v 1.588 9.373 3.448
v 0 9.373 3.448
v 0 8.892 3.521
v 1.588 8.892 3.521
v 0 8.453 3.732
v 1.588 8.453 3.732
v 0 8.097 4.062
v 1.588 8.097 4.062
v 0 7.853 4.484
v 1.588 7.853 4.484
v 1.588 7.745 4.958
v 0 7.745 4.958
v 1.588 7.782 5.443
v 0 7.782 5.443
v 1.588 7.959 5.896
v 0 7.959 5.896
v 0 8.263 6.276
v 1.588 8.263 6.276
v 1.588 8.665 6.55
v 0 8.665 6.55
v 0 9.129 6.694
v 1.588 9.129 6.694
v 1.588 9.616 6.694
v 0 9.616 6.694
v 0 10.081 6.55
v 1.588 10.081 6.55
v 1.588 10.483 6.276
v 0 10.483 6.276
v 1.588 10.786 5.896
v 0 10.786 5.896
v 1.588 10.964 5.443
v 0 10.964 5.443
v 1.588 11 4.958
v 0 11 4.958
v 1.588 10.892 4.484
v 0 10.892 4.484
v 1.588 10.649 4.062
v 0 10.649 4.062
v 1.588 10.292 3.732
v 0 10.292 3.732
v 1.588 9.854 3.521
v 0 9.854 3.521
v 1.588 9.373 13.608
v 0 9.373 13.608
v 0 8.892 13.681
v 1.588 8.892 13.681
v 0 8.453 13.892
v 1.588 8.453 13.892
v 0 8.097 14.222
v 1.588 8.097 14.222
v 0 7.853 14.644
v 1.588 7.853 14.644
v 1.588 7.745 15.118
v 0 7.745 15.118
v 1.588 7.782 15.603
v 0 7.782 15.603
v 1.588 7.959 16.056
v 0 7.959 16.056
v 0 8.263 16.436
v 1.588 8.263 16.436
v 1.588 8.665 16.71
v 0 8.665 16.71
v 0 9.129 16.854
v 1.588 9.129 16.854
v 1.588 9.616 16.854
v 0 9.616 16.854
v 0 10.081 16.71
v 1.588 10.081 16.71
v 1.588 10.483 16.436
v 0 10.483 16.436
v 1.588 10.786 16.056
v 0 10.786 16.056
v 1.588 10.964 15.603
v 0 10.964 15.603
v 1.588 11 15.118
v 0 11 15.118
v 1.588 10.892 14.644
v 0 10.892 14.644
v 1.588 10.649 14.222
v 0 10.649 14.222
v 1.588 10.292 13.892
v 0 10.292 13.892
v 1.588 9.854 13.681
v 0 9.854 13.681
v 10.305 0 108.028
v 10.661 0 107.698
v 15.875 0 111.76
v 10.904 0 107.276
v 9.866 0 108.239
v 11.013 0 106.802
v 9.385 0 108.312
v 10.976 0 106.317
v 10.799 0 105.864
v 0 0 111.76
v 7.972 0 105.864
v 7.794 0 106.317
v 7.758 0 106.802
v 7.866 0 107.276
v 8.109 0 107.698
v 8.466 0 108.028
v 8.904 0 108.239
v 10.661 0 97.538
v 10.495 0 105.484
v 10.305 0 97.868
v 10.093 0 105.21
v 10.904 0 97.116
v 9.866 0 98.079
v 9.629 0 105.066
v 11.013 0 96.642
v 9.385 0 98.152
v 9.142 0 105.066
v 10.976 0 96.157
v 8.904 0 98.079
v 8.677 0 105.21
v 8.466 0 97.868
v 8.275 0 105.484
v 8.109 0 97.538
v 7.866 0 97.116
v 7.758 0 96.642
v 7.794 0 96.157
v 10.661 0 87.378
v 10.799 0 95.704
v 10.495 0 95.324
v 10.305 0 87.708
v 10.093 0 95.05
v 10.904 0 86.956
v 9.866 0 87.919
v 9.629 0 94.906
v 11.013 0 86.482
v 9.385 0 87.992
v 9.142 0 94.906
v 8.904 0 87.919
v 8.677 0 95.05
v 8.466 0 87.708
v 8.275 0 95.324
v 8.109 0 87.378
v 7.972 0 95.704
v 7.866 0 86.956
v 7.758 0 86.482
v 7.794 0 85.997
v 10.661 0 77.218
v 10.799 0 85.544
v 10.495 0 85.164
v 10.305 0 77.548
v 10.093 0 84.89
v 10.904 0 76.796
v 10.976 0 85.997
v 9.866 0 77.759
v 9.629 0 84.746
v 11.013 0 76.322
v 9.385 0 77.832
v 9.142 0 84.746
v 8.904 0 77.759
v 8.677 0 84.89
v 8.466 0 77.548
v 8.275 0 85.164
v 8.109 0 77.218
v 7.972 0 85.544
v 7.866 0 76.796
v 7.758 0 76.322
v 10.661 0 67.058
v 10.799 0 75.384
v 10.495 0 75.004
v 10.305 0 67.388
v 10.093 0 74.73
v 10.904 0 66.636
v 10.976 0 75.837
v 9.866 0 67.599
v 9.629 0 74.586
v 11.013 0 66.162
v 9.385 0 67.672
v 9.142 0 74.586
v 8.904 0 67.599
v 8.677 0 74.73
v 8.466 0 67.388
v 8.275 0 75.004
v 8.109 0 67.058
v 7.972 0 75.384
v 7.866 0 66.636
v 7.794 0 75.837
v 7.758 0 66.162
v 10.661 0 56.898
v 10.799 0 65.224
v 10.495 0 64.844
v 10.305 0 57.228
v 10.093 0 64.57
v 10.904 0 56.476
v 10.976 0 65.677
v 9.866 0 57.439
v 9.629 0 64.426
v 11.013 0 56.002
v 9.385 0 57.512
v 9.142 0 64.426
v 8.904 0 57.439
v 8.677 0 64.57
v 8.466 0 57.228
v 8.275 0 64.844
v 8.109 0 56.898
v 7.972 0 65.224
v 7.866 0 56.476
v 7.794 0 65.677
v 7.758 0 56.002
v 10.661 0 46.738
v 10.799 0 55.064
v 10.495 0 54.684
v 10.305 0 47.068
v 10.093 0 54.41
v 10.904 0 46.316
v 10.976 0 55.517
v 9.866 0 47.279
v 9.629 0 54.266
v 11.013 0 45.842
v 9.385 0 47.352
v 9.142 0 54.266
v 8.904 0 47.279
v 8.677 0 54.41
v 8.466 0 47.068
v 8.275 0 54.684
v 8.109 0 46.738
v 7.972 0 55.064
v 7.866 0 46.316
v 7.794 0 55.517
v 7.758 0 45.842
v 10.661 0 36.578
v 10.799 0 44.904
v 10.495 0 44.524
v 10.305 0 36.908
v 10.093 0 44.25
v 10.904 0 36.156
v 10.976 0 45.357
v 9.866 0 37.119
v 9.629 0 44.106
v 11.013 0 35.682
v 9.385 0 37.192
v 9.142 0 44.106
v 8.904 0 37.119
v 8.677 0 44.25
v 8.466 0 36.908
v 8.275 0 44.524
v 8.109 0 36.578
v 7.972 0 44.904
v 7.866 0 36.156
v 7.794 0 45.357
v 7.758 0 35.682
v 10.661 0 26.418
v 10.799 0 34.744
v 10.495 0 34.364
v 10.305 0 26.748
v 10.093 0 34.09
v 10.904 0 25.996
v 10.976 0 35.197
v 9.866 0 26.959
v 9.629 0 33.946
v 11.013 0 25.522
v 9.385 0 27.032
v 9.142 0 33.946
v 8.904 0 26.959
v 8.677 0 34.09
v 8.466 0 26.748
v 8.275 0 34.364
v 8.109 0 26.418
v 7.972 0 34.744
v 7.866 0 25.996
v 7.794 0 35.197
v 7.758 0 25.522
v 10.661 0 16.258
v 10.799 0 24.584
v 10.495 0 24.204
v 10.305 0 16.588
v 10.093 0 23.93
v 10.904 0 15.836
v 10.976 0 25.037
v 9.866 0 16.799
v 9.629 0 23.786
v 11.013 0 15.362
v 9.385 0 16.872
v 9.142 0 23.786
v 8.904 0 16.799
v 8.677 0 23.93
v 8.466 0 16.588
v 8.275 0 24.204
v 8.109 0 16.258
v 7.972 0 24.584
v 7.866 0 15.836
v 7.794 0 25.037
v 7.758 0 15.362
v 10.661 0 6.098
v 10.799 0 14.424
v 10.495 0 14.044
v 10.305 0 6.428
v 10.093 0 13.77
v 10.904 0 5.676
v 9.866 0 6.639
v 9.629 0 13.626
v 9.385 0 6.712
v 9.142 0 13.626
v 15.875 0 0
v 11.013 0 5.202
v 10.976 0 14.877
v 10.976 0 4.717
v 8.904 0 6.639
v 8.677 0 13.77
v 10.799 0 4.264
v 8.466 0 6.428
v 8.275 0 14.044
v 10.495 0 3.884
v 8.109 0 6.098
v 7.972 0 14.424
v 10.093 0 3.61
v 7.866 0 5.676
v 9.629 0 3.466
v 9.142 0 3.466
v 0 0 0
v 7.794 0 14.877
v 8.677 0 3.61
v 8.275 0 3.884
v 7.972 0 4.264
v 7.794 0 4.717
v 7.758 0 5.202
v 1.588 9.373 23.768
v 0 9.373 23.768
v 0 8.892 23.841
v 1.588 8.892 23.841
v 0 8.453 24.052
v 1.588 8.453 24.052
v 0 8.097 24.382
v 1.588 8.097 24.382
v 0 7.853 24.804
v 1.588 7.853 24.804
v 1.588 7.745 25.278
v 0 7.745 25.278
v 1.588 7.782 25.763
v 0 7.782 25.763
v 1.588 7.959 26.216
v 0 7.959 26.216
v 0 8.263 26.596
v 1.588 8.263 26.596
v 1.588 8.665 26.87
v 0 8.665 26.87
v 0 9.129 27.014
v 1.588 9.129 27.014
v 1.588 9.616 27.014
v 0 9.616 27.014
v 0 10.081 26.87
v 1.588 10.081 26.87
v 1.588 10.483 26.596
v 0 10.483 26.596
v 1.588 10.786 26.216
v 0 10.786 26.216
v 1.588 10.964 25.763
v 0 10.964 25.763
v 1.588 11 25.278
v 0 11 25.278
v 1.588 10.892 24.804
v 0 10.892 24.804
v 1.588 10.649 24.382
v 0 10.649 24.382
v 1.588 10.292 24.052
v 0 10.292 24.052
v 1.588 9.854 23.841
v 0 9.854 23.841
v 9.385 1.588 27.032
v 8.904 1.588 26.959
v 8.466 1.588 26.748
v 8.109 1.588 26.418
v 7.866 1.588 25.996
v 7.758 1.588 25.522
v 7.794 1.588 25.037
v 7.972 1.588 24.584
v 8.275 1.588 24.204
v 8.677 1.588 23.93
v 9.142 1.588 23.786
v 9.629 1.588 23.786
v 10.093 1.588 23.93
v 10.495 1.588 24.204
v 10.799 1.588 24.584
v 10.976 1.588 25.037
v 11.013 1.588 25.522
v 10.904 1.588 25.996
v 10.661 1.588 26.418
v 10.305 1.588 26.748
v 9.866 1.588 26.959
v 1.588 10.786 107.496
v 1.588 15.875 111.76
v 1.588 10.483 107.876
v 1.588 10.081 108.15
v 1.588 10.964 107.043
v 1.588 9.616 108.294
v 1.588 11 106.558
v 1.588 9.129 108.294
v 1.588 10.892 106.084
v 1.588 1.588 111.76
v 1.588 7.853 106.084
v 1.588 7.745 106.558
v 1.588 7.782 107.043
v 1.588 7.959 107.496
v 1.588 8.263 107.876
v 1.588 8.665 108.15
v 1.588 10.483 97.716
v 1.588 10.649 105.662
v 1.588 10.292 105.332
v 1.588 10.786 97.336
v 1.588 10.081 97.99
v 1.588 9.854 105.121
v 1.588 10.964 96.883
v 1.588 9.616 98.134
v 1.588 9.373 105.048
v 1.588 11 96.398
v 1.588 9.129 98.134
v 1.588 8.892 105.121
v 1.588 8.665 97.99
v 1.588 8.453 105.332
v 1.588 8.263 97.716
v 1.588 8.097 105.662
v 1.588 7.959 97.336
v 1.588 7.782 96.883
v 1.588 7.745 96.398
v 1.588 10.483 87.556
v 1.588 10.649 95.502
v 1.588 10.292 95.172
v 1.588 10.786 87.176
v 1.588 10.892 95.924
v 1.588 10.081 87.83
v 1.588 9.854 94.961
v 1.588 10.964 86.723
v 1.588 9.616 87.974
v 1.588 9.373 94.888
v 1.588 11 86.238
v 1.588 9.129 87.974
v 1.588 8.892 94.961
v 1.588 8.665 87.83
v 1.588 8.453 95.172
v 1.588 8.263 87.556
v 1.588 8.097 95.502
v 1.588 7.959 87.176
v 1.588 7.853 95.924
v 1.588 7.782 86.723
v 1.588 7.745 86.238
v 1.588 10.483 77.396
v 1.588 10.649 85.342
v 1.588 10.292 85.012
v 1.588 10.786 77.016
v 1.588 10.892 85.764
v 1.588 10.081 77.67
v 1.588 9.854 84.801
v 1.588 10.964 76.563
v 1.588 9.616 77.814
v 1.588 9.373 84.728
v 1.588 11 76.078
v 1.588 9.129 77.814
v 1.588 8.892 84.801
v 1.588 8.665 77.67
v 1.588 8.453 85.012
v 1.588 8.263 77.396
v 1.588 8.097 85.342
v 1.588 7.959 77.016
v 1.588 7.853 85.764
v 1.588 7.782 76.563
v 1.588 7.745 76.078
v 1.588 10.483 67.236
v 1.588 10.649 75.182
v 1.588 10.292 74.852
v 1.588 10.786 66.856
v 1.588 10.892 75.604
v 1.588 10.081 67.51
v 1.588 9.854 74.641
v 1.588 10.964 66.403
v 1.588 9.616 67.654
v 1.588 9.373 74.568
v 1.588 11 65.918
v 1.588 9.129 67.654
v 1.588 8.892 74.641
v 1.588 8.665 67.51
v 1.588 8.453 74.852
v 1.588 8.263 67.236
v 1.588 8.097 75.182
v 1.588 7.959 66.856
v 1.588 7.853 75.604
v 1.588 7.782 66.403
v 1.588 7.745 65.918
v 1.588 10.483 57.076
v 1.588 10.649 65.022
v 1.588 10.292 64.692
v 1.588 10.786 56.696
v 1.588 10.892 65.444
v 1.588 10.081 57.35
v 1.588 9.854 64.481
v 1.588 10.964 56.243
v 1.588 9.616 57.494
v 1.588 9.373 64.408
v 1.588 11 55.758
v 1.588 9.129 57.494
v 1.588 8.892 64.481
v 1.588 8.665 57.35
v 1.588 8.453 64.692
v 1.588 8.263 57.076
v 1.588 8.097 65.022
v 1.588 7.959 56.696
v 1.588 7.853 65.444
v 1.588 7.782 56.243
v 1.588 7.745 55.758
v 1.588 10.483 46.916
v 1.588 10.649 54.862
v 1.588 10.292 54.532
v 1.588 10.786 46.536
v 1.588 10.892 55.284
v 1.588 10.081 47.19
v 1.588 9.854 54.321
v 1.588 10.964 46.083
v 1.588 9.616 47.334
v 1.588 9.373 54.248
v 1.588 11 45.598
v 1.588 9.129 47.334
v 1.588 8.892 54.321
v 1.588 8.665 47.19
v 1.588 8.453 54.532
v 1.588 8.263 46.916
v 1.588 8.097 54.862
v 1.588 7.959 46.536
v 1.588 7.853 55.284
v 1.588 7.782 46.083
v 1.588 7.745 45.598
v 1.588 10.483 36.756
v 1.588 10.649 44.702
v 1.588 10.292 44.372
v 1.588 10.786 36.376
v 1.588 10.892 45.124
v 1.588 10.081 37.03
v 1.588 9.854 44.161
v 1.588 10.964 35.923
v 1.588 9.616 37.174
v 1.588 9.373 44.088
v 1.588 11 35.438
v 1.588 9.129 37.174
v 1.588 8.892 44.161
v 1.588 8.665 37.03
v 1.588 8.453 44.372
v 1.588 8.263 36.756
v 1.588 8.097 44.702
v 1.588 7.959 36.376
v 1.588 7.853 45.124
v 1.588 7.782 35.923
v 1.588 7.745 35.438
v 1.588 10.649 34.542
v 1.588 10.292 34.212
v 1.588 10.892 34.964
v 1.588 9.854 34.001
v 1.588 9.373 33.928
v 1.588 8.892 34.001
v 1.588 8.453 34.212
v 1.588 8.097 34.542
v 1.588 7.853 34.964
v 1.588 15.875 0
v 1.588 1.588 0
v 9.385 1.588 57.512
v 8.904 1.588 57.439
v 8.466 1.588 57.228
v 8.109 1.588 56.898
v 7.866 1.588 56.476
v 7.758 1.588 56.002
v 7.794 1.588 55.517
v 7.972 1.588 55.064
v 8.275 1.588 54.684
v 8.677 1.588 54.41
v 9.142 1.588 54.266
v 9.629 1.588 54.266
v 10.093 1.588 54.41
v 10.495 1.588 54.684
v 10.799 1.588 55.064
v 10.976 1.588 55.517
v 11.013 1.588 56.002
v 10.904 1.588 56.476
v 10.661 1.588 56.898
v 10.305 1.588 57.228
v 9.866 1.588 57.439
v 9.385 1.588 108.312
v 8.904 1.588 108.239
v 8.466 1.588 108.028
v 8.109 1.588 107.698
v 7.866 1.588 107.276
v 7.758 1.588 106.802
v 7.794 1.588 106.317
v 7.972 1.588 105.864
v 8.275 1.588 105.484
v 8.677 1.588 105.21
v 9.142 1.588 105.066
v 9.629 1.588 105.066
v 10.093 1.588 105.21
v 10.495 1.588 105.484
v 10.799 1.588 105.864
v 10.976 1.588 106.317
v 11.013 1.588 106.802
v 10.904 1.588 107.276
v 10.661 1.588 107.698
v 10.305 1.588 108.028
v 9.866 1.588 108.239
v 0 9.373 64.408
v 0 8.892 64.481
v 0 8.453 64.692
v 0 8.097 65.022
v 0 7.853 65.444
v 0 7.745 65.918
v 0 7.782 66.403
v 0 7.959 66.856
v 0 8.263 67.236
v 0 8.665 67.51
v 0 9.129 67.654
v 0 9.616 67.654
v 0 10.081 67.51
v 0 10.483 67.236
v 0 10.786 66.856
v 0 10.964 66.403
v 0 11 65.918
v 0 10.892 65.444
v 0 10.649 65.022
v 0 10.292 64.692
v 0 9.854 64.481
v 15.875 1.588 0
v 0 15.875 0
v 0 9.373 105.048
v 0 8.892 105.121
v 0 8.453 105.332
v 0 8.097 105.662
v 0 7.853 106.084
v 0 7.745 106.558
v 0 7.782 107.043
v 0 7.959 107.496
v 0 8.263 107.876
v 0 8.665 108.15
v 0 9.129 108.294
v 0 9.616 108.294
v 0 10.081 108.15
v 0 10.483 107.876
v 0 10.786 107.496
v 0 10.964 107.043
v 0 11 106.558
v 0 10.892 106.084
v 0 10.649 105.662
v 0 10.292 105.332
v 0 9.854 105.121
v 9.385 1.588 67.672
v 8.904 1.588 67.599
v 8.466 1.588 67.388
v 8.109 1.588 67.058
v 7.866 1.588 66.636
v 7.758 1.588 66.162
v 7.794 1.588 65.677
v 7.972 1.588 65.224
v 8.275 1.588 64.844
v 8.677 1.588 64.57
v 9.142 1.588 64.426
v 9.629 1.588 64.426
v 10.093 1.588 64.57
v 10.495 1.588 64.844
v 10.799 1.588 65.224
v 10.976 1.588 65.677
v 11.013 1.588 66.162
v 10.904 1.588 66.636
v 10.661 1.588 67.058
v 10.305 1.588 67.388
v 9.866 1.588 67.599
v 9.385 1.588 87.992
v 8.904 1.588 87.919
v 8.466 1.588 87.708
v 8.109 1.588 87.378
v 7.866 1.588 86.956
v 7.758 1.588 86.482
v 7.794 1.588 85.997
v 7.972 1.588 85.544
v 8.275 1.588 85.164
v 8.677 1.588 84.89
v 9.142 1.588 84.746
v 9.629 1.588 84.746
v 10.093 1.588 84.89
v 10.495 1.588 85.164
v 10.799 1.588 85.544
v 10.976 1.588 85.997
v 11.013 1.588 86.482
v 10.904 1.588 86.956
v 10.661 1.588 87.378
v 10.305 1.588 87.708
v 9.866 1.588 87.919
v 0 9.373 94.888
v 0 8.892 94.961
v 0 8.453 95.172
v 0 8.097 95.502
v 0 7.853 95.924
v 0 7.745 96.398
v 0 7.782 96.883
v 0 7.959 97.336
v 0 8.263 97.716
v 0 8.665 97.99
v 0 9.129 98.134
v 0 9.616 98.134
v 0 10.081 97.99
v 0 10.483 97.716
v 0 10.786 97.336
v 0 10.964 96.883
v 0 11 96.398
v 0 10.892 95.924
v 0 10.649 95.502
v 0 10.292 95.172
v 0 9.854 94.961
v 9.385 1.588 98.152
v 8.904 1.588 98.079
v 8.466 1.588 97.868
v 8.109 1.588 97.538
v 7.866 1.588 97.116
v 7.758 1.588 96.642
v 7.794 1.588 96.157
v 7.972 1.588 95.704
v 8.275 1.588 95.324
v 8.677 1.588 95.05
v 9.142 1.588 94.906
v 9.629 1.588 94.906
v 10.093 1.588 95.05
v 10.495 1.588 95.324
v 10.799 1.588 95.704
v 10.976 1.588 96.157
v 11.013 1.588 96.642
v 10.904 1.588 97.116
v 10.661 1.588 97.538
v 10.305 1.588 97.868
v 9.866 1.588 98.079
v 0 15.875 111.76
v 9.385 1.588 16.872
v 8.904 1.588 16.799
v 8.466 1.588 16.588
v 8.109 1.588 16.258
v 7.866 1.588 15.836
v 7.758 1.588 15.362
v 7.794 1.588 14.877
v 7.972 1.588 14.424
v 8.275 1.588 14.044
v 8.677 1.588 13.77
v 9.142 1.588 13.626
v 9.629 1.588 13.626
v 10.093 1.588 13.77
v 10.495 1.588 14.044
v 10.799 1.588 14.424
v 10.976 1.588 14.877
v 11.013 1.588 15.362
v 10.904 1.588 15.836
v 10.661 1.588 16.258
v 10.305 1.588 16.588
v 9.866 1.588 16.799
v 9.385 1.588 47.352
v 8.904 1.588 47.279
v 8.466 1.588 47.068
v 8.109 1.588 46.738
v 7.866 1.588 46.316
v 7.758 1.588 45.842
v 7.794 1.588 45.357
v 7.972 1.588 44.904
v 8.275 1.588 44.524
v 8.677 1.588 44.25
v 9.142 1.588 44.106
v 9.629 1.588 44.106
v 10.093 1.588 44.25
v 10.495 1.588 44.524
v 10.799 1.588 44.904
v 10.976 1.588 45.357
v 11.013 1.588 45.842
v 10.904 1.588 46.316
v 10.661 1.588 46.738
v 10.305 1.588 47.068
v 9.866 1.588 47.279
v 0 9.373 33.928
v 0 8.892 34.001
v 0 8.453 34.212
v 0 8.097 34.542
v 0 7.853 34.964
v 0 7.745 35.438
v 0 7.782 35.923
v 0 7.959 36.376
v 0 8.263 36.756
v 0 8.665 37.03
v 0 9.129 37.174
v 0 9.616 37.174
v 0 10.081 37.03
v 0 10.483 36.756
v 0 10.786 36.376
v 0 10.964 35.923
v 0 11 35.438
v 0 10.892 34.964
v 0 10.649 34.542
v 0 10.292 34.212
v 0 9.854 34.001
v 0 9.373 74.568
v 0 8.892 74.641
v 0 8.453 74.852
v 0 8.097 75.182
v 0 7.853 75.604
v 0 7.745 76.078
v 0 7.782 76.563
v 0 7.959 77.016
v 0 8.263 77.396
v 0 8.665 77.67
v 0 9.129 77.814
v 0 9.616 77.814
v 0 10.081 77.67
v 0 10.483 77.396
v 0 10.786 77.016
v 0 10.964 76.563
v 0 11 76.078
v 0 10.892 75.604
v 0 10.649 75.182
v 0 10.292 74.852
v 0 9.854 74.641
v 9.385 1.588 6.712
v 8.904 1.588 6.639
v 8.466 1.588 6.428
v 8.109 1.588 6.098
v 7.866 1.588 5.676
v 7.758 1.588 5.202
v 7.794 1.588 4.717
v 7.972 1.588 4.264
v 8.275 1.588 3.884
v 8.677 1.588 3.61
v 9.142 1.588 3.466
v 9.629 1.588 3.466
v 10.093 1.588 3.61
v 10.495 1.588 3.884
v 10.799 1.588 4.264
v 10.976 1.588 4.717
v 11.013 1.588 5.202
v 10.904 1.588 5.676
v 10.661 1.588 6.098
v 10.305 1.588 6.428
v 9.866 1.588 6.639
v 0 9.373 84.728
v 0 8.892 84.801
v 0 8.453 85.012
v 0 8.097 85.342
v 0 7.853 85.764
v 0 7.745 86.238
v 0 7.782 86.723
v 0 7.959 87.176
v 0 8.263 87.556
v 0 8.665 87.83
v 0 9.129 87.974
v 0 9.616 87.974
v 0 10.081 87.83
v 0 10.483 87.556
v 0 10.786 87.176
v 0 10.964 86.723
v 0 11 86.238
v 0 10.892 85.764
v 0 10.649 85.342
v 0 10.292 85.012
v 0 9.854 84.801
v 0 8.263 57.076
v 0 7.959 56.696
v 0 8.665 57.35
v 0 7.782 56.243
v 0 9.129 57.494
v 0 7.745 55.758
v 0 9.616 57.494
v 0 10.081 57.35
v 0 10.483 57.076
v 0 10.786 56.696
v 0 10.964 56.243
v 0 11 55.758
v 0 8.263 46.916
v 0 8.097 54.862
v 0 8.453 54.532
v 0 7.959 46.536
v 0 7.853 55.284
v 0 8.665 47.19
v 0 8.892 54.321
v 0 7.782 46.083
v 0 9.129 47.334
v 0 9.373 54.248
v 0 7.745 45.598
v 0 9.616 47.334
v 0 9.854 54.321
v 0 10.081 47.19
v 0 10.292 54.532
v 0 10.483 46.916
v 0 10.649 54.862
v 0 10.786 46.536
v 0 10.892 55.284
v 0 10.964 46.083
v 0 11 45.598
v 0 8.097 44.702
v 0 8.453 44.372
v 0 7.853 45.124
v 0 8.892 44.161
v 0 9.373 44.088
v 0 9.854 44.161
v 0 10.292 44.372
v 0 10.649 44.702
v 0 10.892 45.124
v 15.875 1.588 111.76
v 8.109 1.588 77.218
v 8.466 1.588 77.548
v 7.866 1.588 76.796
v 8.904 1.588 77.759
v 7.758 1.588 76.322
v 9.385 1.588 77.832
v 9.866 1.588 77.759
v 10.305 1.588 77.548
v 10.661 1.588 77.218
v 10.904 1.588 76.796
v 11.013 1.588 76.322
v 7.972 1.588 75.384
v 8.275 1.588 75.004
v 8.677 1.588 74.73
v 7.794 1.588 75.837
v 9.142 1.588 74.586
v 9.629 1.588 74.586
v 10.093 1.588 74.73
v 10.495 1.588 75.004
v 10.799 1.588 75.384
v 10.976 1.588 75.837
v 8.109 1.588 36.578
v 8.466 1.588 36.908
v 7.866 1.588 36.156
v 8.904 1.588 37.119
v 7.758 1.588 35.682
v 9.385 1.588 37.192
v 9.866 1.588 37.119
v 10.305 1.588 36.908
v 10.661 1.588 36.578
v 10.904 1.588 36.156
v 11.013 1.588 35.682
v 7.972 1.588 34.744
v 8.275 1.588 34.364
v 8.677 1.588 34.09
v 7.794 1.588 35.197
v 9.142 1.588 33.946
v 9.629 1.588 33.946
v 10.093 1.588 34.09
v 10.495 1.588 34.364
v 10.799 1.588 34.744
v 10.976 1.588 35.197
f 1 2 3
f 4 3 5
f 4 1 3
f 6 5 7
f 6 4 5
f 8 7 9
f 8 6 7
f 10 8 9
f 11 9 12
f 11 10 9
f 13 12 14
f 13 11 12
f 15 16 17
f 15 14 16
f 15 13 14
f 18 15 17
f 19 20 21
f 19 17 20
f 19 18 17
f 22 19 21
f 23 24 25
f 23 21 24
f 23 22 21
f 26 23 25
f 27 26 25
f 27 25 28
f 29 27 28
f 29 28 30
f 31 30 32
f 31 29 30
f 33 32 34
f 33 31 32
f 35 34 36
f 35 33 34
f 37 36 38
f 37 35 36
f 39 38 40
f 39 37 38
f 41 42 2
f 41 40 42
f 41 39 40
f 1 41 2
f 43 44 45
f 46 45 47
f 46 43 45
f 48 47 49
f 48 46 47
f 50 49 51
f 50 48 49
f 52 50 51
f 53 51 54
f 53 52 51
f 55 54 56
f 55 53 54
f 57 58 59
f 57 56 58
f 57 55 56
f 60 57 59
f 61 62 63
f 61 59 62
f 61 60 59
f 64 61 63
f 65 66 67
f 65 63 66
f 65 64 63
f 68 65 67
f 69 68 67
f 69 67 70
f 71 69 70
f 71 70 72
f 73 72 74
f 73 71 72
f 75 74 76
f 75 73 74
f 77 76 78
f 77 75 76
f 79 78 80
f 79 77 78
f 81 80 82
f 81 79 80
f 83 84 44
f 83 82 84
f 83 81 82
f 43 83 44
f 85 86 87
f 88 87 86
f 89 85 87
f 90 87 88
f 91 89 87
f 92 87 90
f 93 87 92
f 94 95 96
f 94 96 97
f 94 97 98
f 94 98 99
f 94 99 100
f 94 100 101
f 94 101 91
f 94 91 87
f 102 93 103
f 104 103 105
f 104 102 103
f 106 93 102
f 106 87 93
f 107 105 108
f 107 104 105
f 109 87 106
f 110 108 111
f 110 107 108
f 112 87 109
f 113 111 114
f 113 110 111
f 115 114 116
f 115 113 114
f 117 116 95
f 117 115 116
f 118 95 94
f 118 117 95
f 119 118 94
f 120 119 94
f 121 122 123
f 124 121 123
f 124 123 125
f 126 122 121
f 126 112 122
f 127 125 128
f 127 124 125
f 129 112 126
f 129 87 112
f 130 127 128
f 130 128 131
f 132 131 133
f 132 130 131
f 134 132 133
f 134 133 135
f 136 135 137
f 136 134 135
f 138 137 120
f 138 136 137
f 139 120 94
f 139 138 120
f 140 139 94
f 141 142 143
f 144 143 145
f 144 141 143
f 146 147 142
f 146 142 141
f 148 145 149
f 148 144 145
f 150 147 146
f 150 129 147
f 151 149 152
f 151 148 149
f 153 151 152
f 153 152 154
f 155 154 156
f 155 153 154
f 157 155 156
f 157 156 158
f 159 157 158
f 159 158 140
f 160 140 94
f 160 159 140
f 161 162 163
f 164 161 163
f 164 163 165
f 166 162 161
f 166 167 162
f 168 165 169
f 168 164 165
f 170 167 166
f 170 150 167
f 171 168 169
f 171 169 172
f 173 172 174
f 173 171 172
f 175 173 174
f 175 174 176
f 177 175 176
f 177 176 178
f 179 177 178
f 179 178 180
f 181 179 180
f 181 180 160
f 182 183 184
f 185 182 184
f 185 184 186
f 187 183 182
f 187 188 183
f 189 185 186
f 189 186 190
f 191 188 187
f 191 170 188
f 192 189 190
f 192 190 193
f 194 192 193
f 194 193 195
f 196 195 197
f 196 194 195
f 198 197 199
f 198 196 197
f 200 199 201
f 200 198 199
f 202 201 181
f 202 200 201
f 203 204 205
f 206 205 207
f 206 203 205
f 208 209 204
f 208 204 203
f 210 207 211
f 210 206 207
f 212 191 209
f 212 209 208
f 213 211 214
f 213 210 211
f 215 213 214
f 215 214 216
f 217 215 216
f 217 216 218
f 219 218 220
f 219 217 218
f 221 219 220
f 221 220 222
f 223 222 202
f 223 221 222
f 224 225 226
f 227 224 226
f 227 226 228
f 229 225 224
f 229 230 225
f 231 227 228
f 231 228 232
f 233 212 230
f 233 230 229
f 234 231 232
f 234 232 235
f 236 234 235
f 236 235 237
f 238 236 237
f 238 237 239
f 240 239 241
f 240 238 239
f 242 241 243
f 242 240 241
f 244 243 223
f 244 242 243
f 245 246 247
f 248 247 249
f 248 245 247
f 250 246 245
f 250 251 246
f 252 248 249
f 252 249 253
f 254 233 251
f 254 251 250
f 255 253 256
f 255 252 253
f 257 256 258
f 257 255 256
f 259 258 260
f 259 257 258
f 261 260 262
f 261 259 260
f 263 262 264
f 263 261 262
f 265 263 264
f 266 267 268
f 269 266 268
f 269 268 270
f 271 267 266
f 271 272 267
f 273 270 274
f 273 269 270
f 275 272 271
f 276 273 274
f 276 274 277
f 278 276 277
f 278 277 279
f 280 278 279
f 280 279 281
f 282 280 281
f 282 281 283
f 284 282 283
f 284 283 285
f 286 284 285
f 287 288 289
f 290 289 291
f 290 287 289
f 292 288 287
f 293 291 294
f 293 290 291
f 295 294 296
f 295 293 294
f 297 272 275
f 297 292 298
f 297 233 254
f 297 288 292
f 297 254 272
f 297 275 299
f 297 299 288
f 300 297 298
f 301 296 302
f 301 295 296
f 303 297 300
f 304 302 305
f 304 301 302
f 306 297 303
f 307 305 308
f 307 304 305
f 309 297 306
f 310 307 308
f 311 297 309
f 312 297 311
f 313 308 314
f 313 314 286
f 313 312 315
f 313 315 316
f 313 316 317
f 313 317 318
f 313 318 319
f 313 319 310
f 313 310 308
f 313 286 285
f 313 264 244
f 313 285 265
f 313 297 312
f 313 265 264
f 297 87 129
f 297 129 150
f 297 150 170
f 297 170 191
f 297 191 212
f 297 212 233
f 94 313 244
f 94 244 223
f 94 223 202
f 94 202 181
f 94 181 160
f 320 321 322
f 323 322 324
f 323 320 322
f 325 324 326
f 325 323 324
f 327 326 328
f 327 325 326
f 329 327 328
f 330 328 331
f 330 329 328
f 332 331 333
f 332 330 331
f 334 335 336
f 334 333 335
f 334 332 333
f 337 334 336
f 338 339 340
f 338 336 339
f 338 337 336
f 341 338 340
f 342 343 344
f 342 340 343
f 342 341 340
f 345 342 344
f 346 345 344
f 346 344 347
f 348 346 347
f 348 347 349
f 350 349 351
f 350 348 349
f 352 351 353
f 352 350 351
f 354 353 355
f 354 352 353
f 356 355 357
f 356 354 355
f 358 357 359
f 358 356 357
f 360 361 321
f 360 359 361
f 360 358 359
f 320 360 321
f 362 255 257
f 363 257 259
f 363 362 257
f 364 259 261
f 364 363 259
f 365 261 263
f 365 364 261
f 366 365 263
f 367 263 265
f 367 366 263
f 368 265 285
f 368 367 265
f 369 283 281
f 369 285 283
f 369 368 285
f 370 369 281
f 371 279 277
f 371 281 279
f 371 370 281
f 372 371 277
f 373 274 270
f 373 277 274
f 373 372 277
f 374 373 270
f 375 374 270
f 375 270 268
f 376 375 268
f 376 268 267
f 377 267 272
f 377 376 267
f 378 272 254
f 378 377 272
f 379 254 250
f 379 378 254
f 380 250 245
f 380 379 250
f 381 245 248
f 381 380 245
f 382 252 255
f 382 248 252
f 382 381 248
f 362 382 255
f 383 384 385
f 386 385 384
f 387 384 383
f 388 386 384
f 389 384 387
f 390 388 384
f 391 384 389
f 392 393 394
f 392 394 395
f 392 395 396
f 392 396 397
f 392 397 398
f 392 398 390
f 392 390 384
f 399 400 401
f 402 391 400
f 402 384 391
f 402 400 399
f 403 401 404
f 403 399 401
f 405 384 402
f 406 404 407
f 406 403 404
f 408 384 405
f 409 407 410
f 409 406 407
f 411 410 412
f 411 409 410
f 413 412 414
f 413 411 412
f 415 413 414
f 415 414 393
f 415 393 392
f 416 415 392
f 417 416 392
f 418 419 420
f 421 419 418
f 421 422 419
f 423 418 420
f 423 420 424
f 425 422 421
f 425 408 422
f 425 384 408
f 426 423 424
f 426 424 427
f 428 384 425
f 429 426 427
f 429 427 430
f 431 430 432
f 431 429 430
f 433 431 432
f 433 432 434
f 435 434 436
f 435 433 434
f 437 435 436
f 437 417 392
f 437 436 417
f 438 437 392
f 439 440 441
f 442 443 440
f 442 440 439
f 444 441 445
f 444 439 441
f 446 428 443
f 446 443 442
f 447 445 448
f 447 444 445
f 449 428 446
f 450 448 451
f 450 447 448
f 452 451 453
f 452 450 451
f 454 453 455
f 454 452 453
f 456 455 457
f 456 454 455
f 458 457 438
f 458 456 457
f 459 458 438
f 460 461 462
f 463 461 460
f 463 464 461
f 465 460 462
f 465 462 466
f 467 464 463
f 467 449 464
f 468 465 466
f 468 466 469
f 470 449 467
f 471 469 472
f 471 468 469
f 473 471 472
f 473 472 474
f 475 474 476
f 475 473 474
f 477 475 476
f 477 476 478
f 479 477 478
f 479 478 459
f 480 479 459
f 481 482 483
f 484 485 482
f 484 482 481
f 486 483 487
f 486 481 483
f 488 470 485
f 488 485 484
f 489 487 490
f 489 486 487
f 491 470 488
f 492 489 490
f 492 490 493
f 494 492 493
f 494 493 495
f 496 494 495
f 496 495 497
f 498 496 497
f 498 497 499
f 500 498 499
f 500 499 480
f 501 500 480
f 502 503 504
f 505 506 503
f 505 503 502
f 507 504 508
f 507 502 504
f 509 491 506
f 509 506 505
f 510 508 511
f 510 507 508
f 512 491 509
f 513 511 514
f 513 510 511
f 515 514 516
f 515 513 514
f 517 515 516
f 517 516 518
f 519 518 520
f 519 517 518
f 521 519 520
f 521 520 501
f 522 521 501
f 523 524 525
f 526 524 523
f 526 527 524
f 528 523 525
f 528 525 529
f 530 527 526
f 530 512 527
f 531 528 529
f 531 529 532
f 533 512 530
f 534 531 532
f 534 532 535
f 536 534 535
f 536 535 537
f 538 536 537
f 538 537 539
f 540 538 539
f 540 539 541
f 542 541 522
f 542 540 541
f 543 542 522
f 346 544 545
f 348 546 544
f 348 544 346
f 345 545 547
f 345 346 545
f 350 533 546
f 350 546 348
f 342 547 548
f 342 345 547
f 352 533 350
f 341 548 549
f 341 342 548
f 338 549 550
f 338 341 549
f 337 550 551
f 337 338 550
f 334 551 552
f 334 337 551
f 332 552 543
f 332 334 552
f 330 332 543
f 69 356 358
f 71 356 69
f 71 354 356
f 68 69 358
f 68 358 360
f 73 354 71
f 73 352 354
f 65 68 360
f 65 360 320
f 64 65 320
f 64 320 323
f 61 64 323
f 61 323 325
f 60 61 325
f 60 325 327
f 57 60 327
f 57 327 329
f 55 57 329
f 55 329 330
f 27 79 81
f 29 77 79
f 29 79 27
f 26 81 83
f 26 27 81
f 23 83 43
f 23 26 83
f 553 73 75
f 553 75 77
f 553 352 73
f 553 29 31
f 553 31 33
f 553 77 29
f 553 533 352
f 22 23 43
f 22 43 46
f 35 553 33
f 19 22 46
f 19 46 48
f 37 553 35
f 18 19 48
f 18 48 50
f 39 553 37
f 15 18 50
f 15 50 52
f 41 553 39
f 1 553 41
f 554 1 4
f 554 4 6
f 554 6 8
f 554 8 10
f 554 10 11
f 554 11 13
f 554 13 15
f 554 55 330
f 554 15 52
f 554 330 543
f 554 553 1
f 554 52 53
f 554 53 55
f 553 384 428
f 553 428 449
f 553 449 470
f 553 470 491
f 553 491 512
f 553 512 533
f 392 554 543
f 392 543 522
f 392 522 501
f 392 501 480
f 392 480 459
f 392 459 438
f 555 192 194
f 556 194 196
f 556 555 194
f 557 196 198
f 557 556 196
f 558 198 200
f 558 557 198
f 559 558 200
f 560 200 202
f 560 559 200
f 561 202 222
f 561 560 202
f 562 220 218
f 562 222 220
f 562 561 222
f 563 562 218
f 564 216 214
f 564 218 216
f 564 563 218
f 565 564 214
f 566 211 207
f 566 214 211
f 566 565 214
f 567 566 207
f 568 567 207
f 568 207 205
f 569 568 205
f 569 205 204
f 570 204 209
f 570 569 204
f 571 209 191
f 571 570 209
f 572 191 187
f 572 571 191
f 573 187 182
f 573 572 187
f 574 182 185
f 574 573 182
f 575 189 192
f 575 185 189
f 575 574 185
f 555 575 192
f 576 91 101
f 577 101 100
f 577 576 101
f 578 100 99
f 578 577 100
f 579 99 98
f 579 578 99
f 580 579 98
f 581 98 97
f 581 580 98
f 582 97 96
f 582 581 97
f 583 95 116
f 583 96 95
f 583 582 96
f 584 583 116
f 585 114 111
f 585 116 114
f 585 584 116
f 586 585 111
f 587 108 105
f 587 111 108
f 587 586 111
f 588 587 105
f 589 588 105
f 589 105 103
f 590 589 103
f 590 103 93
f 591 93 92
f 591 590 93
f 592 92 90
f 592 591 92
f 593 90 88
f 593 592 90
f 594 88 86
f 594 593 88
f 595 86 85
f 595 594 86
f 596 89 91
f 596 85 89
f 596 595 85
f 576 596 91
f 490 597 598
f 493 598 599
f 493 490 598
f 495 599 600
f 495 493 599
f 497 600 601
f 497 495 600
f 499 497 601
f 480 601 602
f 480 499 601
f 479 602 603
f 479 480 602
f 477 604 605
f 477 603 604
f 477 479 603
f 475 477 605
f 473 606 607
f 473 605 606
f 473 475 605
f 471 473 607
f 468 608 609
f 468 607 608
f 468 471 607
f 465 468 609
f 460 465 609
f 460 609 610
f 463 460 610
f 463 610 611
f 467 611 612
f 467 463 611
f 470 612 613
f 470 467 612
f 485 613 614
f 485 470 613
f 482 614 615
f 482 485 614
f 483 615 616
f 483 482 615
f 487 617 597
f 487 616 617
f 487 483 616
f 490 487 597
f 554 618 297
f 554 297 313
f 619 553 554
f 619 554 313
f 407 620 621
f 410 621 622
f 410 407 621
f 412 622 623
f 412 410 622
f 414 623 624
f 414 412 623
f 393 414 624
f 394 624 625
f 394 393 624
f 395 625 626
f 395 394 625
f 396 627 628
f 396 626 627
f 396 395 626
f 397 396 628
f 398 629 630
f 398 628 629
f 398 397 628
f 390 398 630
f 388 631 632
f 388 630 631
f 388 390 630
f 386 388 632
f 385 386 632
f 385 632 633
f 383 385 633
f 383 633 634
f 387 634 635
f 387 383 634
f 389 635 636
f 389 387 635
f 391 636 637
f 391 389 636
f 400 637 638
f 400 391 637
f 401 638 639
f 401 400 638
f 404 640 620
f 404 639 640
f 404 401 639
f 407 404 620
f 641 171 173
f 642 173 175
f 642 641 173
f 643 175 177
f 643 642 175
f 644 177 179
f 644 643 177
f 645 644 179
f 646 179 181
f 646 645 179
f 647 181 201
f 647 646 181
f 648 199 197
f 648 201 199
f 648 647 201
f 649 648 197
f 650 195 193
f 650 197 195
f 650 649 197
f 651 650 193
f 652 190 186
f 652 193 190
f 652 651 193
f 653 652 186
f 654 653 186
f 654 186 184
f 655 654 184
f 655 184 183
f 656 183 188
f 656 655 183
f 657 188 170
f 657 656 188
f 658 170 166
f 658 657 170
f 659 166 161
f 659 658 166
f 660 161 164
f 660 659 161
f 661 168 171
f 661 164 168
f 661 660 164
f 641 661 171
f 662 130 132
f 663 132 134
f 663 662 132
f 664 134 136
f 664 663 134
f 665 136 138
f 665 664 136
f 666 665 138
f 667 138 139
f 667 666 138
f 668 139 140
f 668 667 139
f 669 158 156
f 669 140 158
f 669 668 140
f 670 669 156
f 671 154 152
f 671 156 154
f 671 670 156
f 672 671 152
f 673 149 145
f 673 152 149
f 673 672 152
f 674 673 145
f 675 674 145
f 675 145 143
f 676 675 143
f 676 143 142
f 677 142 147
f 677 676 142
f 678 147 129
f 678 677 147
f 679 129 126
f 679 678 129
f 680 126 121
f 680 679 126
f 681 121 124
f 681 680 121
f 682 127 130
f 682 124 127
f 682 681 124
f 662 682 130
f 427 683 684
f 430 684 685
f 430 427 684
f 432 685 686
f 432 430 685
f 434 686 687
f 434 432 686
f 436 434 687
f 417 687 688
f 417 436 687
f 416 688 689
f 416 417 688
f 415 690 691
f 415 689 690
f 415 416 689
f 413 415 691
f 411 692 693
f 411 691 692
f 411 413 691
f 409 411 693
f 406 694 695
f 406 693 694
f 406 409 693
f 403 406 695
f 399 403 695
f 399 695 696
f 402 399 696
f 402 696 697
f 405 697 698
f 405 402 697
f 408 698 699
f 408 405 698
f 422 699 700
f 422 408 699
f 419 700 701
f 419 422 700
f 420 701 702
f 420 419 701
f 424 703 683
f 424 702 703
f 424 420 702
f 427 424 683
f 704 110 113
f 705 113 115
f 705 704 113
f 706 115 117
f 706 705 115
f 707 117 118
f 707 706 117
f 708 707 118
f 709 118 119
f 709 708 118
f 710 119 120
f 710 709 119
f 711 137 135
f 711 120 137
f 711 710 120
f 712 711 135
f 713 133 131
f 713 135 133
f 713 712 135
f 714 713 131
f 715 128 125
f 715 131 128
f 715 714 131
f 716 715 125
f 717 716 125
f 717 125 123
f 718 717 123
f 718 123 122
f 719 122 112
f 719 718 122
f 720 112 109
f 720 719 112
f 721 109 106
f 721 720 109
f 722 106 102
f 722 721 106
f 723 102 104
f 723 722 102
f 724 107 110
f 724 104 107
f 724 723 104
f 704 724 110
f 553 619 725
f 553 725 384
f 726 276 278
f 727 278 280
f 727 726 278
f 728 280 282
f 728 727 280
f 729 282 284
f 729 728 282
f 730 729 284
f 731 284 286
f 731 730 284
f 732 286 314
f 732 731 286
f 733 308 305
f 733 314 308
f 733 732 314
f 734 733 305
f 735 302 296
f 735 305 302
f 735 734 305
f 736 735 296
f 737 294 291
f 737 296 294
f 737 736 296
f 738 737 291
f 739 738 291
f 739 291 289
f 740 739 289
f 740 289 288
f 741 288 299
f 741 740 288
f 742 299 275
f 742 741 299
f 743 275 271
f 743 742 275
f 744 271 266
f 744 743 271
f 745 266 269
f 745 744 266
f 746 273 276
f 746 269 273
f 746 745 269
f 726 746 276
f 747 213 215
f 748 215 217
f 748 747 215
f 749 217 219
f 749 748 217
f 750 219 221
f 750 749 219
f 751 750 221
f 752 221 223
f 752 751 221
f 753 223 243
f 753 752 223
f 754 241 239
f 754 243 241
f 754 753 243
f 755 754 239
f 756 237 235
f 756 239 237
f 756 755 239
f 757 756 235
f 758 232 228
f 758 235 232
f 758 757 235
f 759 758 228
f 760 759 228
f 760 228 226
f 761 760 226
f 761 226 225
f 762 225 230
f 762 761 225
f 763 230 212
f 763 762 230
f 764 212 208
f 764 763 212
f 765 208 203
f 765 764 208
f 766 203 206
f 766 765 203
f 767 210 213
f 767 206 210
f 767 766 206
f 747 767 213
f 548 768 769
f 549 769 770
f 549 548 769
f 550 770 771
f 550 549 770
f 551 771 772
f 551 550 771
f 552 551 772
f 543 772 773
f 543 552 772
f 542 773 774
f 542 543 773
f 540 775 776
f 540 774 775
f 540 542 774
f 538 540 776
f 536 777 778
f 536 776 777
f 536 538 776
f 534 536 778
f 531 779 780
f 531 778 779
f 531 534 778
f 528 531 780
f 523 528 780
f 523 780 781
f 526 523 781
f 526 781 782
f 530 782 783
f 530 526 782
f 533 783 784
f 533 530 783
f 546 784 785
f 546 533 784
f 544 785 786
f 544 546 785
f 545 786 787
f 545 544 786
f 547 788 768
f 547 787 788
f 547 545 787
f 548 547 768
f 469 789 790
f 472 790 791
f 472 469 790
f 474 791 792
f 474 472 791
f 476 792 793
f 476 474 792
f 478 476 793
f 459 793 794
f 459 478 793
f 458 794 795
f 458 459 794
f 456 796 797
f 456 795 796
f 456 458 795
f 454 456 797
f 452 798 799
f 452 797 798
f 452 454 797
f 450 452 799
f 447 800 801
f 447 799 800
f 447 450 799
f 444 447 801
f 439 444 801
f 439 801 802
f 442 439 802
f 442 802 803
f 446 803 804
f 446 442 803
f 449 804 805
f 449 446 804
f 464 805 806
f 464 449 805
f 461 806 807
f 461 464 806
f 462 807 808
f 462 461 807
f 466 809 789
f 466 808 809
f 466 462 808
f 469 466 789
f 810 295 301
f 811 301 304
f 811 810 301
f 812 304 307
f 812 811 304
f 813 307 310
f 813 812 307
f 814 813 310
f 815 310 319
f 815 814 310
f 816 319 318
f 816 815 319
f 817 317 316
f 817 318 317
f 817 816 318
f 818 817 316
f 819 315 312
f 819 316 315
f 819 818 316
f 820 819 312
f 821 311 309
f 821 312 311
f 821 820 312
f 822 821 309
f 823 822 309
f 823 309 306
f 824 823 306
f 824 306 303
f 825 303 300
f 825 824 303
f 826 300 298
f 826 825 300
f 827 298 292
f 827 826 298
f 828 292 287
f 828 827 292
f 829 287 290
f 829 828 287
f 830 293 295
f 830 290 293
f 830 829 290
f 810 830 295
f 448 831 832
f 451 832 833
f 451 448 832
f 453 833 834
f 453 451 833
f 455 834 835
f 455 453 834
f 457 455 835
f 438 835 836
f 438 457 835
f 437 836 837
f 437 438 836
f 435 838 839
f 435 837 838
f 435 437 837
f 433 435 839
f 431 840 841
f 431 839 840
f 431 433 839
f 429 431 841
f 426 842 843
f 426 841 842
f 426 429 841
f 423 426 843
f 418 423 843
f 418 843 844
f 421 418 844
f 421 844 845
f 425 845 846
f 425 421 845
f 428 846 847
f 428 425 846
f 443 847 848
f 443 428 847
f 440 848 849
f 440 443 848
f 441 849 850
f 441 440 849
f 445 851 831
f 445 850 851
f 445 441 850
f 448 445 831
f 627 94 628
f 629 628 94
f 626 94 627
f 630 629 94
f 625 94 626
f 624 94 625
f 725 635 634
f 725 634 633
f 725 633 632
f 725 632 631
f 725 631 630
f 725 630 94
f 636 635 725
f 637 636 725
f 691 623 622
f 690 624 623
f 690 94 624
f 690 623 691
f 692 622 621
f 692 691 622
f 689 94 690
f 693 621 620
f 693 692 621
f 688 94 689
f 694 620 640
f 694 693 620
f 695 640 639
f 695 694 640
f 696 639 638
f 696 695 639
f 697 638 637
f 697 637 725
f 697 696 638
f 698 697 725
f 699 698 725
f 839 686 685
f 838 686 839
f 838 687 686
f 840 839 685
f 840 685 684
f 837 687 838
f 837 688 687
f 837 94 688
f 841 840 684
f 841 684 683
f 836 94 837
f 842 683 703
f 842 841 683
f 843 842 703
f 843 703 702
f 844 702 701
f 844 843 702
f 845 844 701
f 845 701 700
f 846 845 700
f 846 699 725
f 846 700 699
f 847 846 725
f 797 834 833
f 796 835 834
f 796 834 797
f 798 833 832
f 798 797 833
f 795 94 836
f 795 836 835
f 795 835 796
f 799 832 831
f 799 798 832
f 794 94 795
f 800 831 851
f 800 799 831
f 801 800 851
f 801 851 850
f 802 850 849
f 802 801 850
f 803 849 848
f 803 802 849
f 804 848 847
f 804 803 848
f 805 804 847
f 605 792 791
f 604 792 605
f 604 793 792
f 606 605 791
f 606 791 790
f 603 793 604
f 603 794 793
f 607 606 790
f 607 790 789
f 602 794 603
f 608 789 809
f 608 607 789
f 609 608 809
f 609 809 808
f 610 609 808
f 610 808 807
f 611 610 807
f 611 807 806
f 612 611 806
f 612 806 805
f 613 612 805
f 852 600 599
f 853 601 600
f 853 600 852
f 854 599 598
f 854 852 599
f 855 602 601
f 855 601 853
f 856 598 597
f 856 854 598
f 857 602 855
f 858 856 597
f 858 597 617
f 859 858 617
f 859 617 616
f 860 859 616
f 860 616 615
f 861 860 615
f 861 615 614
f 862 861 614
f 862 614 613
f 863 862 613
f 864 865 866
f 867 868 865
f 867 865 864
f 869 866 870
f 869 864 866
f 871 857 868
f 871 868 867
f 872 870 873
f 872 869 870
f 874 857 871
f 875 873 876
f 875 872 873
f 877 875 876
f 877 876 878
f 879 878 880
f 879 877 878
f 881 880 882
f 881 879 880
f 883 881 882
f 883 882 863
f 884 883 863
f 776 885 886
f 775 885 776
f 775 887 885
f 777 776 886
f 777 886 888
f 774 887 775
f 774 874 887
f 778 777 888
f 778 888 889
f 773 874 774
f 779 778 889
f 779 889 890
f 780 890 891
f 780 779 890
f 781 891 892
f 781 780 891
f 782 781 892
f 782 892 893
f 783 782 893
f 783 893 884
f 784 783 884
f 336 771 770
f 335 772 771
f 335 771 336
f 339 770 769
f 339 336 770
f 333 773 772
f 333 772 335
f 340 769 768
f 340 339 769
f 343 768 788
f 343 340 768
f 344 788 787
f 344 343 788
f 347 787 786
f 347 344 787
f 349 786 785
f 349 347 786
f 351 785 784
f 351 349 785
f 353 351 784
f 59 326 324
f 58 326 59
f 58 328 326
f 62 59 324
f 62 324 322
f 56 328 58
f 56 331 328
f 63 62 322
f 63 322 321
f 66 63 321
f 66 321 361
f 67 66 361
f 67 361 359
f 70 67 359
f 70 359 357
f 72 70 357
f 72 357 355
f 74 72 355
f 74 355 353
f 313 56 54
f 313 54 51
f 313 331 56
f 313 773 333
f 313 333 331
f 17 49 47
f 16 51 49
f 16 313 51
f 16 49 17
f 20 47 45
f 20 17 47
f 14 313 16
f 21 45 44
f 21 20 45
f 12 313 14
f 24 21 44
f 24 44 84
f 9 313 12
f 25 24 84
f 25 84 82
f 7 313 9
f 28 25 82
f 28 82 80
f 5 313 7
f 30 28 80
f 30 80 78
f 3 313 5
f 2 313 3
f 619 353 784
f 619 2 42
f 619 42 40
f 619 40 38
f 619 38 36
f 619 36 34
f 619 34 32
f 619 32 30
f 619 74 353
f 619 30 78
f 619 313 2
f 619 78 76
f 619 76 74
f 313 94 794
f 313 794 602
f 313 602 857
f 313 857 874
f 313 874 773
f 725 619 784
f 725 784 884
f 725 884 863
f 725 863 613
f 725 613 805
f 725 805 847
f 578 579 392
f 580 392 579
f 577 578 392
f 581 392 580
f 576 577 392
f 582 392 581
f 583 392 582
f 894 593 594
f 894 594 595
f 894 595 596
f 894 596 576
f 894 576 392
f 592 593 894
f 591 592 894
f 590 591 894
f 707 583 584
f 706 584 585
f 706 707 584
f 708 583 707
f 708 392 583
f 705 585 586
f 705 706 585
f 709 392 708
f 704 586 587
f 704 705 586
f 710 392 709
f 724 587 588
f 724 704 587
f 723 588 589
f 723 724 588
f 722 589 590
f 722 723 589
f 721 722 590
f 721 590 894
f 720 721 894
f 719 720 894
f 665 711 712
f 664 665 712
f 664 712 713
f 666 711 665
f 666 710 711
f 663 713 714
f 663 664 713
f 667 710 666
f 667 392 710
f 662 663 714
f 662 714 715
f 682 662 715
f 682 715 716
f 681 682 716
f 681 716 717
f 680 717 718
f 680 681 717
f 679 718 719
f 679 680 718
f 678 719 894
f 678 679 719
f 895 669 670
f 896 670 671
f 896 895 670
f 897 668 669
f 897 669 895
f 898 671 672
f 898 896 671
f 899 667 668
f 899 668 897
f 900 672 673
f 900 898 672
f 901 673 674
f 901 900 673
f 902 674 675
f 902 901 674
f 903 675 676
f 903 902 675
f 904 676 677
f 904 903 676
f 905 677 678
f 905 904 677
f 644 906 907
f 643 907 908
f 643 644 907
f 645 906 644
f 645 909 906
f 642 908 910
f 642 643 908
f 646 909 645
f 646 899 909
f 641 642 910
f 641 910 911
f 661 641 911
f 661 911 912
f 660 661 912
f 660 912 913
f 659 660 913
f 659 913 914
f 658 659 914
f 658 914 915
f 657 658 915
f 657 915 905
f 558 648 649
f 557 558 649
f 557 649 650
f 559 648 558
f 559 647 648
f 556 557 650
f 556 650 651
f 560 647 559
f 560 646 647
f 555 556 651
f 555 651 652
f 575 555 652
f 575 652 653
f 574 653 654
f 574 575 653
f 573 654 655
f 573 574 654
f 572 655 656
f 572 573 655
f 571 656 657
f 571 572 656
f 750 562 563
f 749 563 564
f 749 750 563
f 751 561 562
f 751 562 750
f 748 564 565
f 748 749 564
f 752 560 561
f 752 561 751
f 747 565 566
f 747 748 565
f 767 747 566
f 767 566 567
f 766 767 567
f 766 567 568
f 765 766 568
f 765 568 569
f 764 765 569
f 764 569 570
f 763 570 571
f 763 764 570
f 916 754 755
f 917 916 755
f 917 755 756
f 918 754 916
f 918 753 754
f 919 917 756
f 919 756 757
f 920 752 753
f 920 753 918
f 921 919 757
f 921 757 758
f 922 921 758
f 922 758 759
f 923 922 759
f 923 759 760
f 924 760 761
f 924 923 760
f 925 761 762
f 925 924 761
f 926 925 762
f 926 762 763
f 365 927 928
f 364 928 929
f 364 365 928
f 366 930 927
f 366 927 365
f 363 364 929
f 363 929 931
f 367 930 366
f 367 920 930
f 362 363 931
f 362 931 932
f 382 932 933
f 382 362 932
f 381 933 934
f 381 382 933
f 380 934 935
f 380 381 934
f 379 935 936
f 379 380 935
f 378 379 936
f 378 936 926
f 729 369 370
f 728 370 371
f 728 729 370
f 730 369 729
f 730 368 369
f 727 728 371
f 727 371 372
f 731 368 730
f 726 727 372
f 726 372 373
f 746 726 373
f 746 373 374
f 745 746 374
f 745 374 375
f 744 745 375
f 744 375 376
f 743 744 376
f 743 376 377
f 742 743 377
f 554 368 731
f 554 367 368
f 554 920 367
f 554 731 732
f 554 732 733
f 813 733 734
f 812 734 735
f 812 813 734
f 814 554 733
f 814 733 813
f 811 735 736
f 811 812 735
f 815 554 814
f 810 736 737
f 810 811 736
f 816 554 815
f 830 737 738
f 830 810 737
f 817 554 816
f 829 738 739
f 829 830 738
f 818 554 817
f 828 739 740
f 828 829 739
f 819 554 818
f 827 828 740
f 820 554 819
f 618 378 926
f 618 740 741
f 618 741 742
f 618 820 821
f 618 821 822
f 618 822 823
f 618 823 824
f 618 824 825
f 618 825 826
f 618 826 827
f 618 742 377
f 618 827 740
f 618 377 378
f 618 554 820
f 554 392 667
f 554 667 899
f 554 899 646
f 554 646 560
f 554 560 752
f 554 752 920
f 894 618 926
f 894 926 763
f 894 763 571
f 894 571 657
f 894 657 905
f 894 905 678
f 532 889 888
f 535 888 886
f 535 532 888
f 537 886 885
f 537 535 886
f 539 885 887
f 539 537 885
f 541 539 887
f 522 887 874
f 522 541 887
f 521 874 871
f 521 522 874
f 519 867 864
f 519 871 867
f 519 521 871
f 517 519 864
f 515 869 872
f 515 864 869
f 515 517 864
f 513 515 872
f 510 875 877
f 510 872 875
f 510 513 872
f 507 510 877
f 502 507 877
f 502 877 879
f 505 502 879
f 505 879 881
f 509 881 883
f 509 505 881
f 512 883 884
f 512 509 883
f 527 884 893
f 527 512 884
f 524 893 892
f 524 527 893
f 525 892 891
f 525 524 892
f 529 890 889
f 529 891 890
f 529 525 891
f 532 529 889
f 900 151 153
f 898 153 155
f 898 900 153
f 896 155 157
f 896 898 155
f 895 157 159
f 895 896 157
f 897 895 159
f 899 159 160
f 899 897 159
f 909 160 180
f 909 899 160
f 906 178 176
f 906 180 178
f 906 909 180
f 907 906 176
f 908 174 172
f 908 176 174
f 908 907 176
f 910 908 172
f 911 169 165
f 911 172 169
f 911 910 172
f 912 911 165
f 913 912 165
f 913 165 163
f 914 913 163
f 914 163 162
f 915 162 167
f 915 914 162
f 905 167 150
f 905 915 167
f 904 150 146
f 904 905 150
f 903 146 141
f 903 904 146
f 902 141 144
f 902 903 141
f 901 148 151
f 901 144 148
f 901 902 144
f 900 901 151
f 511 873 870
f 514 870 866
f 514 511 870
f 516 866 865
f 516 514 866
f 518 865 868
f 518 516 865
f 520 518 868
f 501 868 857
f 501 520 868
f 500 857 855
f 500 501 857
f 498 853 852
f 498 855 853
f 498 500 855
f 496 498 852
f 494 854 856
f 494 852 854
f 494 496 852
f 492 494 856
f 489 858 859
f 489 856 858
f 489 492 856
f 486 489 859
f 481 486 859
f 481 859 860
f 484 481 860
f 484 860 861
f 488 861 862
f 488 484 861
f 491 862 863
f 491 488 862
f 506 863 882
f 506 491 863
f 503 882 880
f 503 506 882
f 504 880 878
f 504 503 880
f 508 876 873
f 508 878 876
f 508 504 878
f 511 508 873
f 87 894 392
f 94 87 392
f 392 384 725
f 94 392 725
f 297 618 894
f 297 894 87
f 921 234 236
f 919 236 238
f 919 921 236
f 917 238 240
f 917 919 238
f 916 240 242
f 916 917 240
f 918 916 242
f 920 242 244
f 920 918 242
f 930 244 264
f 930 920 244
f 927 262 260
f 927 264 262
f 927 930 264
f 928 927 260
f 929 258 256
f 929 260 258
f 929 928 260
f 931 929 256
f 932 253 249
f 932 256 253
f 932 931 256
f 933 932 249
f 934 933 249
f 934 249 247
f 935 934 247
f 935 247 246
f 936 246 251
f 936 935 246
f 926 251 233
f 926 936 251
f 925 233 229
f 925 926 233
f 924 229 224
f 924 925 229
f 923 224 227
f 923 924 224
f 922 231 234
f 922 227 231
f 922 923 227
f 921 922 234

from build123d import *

# Parameters (mm, degrees)
EXTRUDE1_DEPTH      = 111.76
LPATTERN1_COUNT     = 6
LPATTERN1_PITCH     = 10.16
LPATTERN1_COL_COUNT = 6
LPATTERN1_COL_PITCH = 10.16
LPATTERN2_COUNT     = 6
LPATTERN2_PITCH     = 10.16
LPATTERN2_COL_COUNT = 6
LPATTERN2_COL_PITCH = 10.16


with BuildPart() as part:
    # Sketch1 → Extrude1 (new body)
    with BuildSketch(Plane.XY):
        Polygon((0, 0), (0, 15.875), (1.5875, 15.875), (1.5875, 1.5875), (15.875, 1.5875), (15.875, 0), align=None)
    extrude(amount=EXTRUDE1_DEPTH)

    # Sketch3 → #4 Clearance Hole1 (revolve, cut)
    with BuildSketch(Plane(origin=(9.3853, 1.5875, 55.88), x_dir=(0, 0, 1), z_dir=(1, 0, 0))):
        Polygon((0, 0), (0, 16.220574487), (1.63195, 15.24), (1.63195, 0), align=None)
    f_4_clearance_hole1 = revolve(axis=Axis((9.3853, 7.9375, 55.88), (0, -1, 0)), mode=Mode.SUBTRACT)

    # LPattern1: #4 Clearance Hole1 ×6
    with Locations(*[(0, 0, i * LPATTERN1_PITCH) for i in range(1, LPATTERN1_COUNT)]):
        add(f_4_clearance_hole1, mode=Mode.SUBTRACT)

    # LPattern1 col: #4 Clearance Hole1 ×6
    with Locations(*[(0, 0, -i * LPATTERN1_COL_PITCH) for i in range(1, LPATTERN1_COL_COUNT)]):
        add(f_4_clearance_hole1, mode=Mode.SUBTRACT)

    # Sketch5 → #4 Clearance Hole2 (revolve, cut)
    with BuildSketch(Plane(origin=(1.5875, 9.3726, 55.88), x_dir=(0, 0, -1), z_dir=(0, 1, 0))):
        Polygon((0, 0), (0, 16.220574487), (1.63195, 15.24), (1.63195, 0), align=None)
    f_4_clearance_hole2 = revolve(axis=Axis((7.9375, 9.3726, 55.88), (-1, 0, 0)), mode=Mode.SUBTRACT)

    # LPattern2: #4 Clearance Hole2 ×6
    with Locations(*[(0, 0, i * LPATTERN2_PITCH) for i in range(1, LPATTERN2_COUNT)]):
        add(f_4_clearance_hole2, mode=Mode.SUBTRACT)

    # LPattern2 col: #4 Clearance Hole2 ×6
    with Locations(*[(0, 0, -i * LPATTERN2_COL_PITCH) for i in range(1, LPATTERN2_COL_COUNT)]):
        add(f_4_clearance_hole2, mode=Mode.SUBTRACT)


solid = part.part
